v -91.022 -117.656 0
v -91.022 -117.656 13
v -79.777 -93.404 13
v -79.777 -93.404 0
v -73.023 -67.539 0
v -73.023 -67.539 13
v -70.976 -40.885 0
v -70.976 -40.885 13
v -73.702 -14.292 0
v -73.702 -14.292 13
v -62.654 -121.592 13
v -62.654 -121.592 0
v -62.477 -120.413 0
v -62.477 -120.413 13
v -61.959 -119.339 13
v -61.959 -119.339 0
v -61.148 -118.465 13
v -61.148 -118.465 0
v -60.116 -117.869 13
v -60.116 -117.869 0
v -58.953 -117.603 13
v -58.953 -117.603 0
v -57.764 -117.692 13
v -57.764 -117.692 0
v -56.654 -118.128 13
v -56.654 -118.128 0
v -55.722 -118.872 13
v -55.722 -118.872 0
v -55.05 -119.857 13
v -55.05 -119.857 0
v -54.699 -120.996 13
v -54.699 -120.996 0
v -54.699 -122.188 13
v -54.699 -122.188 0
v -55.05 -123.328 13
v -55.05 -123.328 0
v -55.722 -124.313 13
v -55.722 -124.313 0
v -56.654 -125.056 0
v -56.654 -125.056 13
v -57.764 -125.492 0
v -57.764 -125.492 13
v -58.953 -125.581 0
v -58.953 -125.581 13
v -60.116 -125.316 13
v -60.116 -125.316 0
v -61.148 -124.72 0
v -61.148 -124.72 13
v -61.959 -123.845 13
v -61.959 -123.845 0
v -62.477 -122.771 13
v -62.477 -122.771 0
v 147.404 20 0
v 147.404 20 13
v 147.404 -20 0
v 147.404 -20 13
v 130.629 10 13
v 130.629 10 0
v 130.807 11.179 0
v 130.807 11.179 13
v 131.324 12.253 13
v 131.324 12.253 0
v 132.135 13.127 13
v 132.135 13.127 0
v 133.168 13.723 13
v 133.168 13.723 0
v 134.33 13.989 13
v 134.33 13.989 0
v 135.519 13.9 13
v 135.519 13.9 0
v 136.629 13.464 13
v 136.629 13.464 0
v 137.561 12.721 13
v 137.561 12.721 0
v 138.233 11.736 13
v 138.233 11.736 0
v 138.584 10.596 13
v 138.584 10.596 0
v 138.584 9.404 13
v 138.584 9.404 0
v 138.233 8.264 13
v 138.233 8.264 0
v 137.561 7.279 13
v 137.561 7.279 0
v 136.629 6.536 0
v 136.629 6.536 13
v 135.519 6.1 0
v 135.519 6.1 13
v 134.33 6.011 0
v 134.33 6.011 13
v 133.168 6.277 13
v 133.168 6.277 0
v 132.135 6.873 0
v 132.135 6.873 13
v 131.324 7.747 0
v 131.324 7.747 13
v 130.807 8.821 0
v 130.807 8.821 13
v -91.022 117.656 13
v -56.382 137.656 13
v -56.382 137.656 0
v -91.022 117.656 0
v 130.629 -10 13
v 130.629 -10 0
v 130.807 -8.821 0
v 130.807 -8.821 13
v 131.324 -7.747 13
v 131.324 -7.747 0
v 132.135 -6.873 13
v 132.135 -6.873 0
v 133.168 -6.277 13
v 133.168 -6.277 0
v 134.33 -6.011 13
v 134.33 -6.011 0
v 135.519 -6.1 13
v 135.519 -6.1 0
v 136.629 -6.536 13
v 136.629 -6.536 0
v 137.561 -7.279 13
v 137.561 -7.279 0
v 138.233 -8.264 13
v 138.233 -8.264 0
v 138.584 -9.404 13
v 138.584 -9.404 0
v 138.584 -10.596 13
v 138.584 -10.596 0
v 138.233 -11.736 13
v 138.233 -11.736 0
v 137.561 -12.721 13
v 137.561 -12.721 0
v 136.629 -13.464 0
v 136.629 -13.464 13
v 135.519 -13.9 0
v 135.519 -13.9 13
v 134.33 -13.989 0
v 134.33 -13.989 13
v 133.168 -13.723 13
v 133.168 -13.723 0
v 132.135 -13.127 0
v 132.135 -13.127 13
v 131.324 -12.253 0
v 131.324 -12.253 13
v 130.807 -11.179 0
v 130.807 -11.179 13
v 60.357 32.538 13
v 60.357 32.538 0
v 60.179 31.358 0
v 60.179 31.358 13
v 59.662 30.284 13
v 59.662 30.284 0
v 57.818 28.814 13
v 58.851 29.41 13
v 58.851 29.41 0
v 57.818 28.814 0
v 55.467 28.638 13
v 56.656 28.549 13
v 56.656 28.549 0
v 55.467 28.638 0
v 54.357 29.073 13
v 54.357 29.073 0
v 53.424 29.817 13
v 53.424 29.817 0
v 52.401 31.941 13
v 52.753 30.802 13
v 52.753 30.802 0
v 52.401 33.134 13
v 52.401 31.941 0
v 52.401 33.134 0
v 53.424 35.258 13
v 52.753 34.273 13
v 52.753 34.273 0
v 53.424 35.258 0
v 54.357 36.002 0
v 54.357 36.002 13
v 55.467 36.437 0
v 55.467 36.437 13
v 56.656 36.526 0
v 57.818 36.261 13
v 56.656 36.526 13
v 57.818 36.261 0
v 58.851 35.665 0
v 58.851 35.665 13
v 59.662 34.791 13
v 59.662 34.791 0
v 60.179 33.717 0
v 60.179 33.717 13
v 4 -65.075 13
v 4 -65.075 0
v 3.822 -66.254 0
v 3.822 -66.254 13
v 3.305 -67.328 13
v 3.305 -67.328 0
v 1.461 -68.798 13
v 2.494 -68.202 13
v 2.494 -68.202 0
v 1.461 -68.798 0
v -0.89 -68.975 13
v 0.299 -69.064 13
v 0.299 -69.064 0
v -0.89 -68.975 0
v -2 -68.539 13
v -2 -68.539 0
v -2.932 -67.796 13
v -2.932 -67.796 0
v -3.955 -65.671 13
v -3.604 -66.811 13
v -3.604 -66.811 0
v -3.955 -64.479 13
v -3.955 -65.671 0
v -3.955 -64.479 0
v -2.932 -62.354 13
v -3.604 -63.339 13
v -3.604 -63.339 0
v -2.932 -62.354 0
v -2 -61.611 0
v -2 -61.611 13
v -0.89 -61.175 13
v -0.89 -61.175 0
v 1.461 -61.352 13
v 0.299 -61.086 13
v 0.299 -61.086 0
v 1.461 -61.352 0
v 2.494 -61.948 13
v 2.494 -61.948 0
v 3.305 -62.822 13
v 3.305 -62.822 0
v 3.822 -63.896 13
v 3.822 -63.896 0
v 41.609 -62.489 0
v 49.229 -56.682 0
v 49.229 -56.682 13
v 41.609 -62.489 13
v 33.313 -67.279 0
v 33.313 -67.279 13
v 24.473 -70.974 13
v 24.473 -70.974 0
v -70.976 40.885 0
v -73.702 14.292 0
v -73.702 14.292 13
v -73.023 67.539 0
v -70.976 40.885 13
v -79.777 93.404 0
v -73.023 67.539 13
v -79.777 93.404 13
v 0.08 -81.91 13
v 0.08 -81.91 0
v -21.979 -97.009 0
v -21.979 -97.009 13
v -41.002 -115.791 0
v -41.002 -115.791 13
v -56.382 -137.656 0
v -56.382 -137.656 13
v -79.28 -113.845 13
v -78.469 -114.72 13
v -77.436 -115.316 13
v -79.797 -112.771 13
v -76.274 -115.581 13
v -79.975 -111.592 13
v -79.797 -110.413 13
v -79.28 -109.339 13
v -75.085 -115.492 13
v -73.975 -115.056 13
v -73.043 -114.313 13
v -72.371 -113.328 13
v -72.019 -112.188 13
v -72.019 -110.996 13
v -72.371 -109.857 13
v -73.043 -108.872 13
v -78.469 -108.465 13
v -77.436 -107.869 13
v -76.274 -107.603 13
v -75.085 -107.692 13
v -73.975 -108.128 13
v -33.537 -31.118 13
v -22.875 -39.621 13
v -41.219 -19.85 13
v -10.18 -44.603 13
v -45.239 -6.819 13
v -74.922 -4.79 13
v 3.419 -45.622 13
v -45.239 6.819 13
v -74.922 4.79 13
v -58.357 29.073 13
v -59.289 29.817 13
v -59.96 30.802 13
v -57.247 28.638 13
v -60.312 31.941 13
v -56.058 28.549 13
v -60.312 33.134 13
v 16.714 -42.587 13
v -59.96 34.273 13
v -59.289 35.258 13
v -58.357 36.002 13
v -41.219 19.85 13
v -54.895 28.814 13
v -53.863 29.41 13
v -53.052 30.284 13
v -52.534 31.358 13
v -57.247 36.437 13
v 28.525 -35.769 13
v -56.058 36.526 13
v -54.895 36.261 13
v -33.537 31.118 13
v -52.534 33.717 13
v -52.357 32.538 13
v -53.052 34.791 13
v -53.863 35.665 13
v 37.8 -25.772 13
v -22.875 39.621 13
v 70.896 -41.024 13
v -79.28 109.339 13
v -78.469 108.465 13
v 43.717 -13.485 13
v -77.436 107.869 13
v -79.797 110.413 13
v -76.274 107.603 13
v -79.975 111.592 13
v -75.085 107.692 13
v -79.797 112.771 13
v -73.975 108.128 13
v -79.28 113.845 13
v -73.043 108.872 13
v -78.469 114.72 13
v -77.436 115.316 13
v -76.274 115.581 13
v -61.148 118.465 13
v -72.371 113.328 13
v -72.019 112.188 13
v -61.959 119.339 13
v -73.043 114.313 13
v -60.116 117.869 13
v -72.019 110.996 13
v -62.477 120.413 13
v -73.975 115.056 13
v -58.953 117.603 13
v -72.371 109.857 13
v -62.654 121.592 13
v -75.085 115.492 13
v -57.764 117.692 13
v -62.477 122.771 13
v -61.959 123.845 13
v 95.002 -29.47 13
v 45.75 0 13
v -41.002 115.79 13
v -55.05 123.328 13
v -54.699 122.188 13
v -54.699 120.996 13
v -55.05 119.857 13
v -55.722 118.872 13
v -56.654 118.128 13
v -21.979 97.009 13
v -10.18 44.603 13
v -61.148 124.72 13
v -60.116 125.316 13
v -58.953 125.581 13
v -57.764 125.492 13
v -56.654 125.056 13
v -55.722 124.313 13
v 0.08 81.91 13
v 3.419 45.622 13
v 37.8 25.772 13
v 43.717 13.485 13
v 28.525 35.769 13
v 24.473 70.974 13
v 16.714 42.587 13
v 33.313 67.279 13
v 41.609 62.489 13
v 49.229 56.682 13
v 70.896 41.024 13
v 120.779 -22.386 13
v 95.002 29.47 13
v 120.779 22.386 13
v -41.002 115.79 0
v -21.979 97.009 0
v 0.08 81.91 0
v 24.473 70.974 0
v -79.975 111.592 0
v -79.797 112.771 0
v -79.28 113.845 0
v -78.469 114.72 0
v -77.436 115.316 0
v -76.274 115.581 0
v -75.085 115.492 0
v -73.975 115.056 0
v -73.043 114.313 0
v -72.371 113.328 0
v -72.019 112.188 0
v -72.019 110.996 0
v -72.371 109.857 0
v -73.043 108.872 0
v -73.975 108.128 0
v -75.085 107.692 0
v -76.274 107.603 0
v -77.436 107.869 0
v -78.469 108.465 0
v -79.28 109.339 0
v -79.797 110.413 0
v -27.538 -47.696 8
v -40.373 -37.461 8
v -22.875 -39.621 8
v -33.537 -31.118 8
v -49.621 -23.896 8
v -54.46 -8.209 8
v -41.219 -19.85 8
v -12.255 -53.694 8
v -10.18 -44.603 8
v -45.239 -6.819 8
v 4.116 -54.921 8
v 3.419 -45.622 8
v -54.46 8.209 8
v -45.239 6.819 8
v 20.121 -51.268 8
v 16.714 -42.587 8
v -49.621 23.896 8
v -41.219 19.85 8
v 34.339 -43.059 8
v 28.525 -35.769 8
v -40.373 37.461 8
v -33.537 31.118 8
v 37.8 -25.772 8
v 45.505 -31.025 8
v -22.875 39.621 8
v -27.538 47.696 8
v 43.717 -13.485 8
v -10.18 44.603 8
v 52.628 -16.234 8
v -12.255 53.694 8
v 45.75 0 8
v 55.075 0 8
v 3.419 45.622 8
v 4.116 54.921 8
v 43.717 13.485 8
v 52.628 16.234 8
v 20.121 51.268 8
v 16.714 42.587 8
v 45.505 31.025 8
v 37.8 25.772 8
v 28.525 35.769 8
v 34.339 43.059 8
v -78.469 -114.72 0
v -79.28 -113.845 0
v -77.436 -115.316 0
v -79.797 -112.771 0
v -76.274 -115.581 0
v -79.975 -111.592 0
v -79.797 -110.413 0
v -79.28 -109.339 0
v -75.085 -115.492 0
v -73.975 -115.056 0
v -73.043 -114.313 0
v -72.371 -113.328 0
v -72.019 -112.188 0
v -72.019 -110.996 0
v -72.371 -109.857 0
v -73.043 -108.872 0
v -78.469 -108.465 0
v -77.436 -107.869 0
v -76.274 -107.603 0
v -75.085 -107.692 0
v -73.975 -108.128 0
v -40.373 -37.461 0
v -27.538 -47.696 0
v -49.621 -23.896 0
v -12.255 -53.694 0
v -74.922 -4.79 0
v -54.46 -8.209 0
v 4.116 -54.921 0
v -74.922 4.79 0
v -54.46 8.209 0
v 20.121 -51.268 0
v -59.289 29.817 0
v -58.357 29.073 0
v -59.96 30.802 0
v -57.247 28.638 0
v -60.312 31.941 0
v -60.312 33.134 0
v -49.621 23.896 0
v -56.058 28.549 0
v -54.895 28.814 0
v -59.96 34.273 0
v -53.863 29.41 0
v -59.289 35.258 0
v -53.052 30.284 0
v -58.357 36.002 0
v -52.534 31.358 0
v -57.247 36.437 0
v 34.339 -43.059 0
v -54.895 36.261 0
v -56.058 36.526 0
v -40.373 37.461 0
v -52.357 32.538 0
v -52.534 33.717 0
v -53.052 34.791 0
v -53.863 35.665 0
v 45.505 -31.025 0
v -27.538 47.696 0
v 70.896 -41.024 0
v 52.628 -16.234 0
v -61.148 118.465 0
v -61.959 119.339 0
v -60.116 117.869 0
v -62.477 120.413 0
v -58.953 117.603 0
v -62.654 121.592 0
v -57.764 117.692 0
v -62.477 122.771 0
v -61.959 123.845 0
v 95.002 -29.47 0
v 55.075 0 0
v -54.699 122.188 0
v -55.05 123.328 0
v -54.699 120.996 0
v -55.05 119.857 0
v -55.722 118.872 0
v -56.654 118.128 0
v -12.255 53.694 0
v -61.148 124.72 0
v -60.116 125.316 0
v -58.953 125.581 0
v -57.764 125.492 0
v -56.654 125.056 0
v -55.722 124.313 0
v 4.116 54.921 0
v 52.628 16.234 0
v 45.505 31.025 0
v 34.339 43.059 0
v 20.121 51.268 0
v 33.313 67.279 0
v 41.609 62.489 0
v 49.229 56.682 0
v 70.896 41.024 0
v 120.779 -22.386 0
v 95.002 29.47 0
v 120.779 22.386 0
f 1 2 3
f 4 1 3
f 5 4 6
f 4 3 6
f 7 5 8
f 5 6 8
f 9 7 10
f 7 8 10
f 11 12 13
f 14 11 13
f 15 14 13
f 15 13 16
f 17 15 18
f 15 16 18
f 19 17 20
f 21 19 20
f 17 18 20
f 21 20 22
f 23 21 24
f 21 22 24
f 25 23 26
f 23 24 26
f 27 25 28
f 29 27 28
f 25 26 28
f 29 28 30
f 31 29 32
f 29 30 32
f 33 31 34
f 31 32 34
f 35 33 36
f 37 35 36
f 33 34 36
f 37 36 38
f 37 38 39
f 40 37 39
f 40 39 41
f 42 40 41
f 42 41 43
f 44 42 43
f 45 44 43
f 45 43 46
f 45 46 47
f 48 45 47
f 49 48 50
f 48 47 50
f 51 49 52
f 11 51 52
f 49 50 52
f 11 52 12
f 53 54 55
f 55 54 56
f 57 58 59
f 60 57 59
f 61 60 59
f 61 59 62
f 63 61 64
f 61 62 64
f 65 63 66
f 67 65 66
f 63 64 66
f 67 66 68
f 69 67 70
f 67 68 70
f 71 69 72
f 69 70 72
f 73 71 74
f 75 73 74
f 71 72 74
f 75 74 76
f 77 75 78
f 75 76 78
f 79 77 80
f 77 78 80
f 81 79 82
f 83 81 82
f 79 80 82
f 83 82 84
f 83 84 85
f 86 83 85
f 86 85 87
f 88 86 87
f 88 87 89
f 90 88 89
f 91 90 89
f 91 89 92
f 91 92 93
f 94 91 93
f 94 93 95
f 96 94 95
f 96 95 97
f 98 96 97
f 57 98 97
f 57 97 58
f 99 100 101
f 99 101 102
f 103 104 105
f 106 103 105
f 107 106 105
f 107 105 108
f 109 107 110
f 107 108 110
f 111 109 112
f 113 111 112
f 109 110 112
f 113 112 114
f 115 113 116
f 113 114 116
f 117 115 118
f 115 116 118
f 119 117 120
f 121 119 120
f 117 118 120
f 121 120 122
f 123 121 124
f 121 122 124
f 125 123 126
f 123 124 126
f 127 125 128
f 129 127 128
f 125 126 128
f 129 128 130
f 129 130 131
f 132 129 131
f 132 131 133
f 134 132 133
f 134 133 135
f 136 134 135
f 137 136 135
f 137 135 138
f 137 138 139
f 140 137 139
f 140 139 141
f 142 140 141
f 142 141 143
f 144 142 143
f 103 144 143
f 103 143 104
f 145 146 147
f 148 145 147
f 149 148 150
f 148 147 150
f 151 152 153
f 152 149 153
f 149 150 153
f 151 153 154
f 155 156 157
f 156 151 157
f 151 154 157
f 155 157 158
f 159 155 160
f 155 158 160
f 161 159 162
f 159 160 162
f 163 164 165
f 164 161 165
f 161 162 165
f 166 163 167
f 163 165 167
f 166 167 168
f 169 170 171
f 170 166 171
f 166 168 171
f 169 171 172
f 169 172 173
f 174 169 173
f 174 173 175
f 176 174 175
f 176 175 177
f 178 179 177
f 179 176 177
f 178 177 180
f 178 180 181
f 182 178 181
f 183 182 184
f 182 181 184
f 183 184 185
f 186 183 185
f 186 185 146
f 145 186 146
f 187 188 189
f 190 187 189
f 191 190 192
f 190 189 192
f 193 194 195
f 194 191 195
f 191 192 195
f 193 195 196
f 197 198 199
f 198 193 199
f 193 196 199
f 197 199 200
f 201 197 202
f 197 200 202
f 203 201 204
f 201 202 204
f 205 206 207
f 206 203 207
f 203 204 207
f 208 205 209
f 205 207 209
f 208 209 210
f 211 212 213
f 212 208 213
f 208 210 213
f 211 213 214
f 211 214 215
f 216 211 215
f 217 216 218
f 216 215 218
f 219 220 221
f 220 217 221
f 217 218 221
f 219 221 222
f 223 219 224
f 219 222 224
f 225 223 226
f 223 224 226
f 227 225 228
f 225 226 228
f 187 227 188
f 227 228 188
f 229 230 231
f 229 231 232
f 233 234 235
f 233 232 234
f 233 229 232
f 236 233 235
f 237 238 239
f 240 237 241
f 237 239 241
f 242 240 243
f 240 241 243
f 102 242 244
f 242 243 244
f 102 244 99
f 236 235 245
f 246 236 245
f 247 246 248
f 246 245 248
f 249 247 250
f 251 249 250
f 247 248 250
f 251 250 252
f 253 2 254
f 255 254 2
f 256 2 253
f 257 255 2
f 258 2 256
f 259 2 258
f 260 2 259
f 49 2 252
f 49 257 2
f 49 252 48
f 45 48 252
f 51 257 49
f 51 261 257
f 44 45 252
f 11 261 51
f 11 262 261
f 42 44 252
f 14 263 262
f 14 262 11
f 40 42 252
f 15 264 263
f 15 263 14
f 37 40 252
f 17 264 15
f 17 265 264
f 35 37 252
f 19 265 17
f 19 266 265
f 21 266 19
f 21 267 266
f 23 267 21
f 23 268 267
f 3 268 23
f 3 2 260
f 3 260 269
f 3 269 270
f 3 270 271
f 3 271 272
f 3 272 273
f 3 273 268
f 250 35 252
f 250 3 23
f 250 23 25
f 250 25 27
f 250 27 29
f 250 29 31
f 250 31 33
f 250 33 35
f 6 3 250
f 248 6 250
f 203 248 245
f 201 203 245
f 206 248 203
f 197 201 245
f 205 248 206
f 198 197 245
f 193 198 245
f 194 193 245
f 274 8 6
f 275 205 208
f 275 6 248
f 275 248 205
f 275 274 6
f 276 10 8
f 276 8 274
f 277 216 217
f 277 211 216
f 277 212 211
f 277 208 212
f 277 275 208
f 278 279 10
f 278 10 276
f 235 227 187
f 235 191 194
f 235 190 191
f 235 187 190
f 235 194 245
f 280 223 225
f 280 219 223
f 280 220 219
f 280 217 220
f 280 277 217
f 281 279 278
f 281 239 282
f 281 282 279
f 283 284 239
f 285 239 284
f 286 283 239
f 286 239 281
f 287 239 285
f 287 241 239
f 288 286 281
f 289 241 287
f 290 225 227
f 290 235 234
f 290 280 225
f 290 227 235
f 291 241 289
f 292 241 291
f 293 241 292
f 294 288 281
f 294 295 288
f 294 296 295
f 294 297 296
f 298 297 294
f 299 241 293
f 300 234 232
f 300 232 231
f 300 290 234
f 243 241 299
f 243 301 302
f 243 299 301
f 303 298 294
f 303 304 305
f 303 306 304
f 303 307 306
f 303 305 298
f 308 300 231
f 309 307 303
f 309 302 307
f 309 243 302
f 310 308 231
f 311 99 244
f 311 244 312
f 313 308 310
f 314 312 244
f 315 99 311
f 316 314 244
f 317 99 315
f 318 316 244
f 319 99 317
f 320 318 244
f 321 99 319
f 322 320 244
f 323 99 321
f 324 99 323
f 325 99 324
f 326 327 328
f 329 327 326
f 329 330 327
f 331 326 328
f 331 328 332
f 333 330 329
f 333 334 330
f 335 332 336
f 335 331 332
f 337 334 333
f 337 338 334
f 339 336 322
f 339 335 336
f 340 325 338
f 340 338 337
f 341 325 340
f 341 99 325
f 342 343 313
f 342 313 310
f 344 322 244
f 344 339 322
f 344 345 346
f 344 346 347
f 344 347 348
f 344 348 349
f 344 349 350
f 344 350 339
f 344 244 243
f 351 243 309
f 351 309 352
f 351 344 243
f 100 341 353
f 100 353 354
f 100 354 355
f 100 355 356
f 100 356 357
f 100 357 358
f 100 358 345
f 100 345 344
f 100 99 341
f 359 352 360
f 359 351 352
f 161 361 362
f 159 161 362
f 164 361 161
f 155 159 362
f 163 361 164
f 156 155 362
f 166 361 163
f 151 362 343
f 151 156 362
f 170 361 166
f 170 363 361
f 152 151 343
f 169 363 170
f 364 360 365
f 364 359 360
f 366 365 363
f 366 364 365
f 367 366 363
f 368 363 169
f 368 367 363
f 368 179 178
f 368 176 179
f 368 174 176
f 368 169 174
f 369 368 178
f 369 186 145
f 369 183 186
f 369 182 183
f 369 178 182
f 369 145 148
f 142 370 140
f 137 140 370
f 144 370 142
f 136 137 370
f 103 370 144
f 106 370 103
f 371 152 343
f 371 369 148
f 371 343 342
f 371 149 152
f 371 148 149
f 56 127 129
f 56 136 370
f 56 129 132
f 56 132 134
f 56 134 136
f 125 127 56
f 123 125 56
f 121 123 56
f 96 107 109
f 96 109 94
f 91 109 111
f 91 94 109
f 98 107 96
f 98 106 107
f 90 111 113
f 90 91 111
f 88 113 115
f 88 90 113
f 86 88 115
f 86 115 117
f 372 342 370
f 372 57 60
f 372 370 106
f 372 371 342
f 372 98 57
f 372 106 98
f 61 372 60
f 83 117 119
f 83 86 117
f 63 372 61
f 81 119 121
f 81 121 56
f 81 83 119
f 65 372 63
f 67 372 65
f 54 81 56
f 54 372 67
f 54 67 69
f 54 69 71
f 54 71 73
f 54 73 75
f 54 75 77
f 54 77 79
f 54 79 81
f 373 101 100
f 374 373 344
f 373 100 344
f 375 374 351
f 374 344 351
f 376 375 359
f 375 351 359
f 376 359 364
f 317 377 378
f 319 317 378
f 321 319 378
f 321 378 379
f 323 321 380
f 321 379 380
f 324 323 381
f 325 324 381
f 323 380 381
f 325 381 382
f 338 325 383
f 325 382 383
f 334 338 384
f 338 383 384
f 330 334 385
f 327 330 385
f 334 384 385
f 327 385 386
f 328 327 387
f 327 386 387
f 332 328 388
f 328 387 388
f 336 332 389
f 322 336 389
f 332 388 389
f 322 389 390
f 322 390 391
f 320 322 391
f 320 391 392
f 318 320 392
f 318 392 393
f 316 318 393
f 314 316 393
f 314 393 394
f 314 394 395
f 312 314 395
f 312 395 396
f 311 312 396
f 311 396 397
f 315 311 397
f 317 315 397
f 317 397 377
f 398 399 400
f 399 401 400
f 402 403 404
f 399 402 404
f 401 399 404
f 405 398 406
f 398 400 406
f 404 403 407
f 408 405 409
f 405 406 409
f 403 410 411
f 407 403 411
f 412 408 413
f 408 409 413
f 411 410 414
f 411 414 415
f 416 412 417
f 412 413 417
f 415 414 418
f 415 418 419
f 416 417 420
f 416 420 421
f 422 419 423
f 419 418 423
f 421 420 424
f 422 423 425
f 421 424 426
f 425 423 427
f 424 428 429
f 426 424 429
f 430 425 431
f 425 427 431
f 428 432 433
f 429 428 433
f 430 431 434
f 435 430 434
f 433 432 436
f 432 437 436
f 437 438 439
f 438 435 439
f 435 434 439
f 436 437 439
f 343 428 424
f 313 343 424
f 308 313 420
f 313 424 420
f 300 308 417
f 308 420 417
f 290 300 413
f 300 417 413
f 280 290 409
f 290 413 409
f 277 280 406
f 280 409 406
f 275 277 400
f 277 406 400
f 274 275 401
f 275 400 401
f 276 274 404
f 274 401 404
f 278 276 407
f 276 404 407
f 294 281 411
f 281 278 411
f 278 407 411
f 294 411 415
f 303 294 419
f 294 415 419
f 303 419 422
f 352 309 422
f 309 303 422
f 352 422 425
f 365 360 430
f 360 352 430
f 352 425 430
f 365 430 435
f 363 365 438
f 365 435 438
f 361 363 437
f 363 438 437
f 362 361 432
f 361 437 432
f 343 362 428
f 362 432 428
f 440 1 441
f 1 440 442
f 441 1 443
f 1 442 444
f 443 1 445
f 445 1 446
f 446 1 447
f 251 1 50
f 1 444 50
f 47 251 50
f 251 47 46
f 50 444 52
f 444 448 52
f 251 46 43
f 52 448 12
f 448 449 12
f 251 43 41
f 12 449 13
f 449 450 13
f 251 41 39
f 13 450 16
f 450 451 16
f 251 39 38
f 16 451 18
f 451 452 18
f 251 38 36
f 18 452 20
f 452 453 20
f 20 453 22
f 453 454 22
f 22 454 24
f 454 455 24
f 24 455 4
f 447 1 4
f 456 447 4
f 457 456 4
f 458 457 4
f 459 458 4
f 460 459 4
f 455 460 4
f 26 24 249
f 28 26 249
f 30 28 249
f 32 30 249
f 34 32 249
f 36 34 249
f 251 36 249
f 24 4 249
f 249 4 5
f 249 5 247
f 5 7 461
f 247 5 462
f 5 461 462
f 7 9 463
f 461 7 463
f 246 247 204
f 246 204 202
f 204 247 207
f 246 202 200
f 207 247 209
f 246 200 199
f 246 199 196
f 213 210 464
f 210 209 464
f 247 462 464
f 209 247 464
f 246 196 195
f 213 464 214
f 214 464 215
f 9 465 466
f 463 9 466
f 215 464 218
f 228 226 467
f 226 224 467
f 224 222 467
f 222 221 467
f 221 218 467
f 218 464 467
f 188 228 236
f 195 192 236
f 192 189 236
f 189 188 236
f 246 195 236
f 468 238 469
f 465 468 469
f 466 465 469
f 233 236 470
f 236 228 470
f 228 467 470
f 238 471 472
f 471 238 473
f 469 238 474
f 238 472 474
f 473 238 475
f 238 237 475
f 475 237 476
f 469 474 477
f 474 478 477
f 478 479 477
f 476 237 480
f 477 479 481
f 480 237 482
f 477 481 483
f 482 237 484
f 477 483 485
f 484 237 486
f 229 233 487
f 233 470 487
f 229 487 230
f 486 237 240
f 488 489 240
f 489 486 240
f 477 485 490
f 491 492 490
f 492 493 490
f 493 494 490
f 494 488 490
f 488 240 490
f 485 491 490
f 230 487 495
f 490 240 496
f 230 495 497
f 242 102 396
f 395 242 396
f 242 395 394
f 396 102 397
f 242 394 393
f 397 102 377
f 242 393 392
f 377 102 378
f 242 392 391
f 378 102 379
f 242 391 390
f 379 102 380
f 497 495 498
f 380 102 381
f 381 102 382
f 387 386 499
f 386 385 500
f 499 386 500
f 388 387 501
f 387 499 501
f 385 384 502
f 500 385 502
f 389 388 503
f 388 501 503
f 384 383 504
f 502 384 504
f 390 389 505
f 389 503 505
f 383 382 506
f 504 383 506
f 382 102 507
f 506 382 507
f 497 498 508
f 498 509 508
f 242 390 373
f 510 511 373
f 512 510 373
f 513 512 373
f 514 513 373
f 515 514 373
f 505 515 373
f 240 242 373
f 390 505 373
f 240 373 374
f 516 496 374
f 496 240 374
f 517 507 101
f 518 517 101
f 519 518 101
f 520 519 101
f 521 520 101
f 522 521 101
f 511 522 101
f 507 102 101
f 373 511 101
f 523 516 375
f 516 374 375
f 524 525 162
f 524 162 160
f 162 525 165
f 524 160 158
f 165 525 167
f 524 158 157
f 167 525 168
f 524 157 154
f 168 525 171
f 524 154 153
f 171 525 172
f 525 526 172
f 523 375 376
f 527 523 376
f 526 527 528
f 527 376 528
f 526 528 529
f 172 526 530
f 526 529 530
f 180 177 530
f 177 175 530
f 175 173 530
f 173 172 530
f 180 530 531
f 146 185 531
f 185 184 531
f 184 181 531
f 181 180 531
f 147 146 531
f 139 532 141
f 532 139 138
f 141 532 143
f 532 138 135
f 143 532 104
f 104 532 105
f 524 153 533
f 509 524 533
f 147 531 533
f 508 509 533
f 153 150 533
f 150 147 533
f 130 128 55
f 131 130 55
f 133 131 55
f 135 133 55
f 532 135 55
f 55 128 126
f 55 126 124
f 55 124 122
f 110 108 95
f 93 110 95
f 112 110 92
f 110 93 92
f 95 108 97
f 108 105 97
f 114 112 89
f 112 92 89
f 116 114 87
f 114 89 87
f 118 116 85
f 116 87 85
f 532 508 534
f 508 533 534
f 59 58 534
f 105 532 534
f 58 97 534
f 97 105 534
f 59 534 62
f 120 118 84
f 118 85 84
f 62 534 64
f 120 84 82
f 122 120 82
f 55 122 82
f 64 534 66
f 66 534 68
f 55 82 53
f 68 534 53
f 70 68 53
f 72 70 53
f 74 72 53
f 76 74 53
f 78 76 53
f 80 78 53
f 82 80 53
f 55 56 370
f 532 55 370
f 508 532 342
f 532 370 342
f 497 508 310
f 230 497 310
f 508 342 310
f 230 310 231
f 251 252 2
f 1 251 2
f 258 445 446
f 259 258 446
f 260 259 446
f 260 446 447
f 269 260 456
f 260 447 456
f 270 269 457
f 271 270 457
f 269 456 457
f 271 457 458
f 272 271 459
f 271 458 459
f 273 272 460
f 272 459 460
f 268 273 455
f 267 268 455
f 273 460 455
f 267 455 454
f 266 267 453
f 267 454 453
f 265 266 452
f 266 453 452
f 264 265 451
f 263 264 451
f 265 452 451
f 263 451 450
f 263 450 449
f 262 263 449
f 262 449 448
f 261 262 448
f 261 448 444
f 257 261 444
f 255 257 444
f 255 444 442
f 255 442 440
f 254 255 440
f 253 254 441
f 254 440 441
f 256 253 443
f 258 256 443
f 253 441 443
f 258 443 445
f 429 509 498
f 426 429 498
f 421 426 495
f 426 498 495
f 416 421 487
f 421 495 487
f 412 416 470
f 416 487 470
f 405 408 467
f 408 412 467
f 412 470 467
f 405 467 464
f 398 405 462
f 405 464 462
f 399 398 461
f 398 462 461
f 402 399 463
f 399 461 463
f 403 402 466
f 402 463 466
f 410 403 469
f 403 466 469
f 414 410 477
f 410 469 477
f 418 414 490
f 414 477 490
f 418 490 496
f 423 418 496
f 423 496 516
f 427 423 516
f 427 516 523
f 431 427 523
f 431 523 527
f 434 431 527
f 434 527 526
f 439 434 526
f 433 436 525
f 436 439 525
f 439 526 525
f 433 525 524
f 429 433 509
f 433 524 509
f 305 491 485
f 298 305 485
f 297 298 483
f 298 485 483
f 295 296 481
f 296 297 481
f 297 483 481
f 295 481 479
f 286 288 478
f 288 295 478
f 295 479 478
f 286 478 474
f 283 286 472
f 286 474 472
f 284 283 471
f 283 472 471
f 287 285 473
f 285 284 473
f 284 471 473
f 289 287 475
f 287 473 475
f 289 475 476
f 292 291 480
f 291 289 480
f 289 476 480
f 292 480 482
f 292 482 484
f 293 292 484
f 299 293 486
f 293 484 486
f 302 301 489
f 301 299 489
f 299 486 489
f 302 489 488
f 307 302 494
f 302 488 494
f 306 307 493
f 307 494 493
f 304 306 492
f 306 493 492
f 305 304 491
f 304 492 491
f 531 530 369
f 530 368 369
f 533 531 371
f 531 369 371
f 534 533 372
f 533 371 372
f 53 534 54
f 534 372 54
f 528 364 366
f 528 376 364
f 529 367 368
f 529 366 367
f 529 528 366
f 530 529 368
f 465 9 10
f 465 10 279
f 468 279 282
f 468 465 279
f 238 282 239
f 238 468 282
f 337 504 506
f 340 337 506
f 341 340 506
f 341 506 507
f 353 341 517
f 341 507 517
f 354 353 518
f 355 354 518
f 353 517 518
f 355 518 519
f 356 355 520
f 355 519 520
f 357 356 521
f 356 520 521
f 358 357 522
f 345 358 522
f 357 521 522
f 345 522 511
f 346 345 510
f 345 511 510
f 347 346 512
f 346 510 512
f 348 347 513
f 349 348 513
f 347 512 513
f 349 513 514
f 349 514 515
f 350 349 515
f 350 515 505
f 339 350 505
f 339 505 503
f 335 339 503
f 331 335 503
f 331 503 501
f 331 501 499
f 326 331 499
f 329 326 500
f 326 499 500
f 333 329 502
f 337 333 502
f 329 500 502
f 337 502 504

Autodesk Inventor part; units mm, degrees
ref_plane "YZ Plane" through (0, 0, 0) normal (1, 0, 0) x (0, 1, 0)
ref_plane "XZ Plane" through (0, 0, 0) normal (0, 1, 0) x (-1, 0, 0)
ref_plane "XY Plane" through (0, 0, 0) normal (0, 0, 1) x (1, 0, 0)
sketch "Sketch1" plane through (0, 0, 0) normal (0, 0, 1) x (1, 0, 0)
  circle A0 centre (0, 0) radius 55.075
  circle A1 centre (0, 0) radius 75.075
  circle A2 centre (0, -65.075) radius 4
  circle A3 centre (-56.3566, 32.5375) radius 4
  circle A4 centre (56.3566, 32.5375) radius 4
  line L0 (0, -65.075) -> (-56.3566, 32.5375) construction
  line L1 (-56.3566, 32.5375) -> (56.3566, 32.5375) construction
  line L2 (0, -65.075) -> (56.3566, 32.5375) construction
  line L3 (0, -61.075) -> (0, -55.075) construction
  line L4 (-52.8925, 30.5375) -> (-47.6963, 27.5375) construction
  line L5 (47.6963, 27.5375) -> (52.8925, 30.5375) construction
  dimension "d4" = 8
  dimension "d0" = 110.15
  dimension "d1" = 20
  dimension "d6" = 6
extrude "Extrusion1" add sketch "Sketch1" along normal blind 8
sketch "Sketch2" plane through (0, 0, 8) normal (0, 0, 1) x (1, 0, 0)
  circle A0 centre (0, 0) radius 55.075 projected
  circle A1 centre (0, 0) radius 45.75
  circle A2 centre (0, 0) radius 75.075 projected
  circle A3 centre (56.3566, 32.5375) radius 4 projected
  circle A4 centre (-56.3566, 32.5375) radius 4 projected
  circle A5 centre (0, -65.075) radius 4 projected
  circle A6 centre (0, 0) radius 55.075 projected
  dimension "d7" = 91.5
extrude "Extrusion2" add sketch "Sketch2" along normal blind 5 contours A0 | A2
sketch "Sketch3" plane through (0, 0, 13) normal (0, 0, 1) x (1, 0, 0)
  circle A0 centre (0, 0) radius 75.075 projected
  line L0 (72.362, 20) -> (147.404, 20)
  line L1 (147.404, 20) -> (147.404, -20)
  line L2 (147.404, -20) -> (72.362, -20)
  circle A1 centre (0, 0) radius 75.075 projected
  line L3 (-18.8605, -72.6673) -> (-56.3815, -137.6556)
  line L4 (-56.3815, -137.6556) -> (-91.0225, -117.6556)
  line L5 (-91.0225, -117.6556) -> (-53.5015, -52.6673)
  line L6 (-18.8605, 72.6673) -> (-56.3815, 137.6556)
  line L7 (-56.3815, 137.6556) -> (-91.0225, 117.6556)
  line L8 (-91.0225, 117.6556) -> (-53.5015, 52.6673)
  line L9 (147.404, 0) -> (-73.702, 127.6556) construction
  line L10 (-73.702, -127.6556) -> (-73.702, 127.6556) construction
  line L11 (147.404, 0) -> (-73.702, -127.6556) construction
  arc A2 (49.2286, 56.6816) -> (147.404, 20) centre (147.404, 169.7201) ccw
  arc A3 (147.404, -20) -> (49.2286, -56.6816) centre (147.404, -169.7201) ccw
  arc A4 (24.4734, -70.974) -> (-56.3815, -137.6556) centre (73.28, -212.5156) ccw
  arc A5 (-91.0225, -117.6556) -> (-73.702, -14.2925) centre (-220.6839, -42.7955) ccw
  arc A6 (-73.702, 14.2925) -> (-91.0225, 117.6556) centre (-220.6839, 42.7955) ccw
  arc A7 (-56.3815, 137.6556) -> (24.4734, 70.974) centre (73.28, 212.5156) ccw
  point P0 (24.4734, 70.974)
  point P1 (24.4734, -70.974)
  point P2 (-73.702, -14.2925)
  point P3 (49.2286, 56.6816)
  point P4 (49.2286, -56.6816)
  dimension "d10" = 40
extrude "Extrusion3" add sketch "Sketch3" against normal up to surface (13 mm away) contours A0 L0 L1 L2 | A0 A2 L0 | L2 A3 A0 | A0 L6 A7 | A4 L3 A0 | A0 L8 L7 L6 | L3 L4 L5 A0 | A0 A6 L8 | L5 A5 A0
sketch "Sketch4" plane through (0, 0, 0) normal (0, 0, -1) x (-1, 0, 0)
  circle A0 centre (0, 0) radius 135 construction
  circle A1 centre (75.9748, 111.5922) radius 4
  circle A2 centre (58.6543, 121.5922) radius 4
  line L0 (58.6543, 121.5922) -> (56.3815, 137.6556) construction
  line L1 (75.9748, 111.5922) -> (91.0225, 117.6556) construction
  circle A3 centre (-134.6291, -10) radius 4
  circle A4 centre (-134.6291, 10) radius 4
  circle A5 centre (75.9748, -111.5922) radius 4
  circle A6 centre (58.6543, -121.5922) radius 4
  dimension "d13" = 8
  dimension "d14" = 270
  dimension "d15" = 20
  dimension "d18" = 360
extrude "Extrusion4" cut sketch "Sketch4" against normal blind 20
equation "\"d2\" = d4"
properties part number "Tractor_Mobile"
